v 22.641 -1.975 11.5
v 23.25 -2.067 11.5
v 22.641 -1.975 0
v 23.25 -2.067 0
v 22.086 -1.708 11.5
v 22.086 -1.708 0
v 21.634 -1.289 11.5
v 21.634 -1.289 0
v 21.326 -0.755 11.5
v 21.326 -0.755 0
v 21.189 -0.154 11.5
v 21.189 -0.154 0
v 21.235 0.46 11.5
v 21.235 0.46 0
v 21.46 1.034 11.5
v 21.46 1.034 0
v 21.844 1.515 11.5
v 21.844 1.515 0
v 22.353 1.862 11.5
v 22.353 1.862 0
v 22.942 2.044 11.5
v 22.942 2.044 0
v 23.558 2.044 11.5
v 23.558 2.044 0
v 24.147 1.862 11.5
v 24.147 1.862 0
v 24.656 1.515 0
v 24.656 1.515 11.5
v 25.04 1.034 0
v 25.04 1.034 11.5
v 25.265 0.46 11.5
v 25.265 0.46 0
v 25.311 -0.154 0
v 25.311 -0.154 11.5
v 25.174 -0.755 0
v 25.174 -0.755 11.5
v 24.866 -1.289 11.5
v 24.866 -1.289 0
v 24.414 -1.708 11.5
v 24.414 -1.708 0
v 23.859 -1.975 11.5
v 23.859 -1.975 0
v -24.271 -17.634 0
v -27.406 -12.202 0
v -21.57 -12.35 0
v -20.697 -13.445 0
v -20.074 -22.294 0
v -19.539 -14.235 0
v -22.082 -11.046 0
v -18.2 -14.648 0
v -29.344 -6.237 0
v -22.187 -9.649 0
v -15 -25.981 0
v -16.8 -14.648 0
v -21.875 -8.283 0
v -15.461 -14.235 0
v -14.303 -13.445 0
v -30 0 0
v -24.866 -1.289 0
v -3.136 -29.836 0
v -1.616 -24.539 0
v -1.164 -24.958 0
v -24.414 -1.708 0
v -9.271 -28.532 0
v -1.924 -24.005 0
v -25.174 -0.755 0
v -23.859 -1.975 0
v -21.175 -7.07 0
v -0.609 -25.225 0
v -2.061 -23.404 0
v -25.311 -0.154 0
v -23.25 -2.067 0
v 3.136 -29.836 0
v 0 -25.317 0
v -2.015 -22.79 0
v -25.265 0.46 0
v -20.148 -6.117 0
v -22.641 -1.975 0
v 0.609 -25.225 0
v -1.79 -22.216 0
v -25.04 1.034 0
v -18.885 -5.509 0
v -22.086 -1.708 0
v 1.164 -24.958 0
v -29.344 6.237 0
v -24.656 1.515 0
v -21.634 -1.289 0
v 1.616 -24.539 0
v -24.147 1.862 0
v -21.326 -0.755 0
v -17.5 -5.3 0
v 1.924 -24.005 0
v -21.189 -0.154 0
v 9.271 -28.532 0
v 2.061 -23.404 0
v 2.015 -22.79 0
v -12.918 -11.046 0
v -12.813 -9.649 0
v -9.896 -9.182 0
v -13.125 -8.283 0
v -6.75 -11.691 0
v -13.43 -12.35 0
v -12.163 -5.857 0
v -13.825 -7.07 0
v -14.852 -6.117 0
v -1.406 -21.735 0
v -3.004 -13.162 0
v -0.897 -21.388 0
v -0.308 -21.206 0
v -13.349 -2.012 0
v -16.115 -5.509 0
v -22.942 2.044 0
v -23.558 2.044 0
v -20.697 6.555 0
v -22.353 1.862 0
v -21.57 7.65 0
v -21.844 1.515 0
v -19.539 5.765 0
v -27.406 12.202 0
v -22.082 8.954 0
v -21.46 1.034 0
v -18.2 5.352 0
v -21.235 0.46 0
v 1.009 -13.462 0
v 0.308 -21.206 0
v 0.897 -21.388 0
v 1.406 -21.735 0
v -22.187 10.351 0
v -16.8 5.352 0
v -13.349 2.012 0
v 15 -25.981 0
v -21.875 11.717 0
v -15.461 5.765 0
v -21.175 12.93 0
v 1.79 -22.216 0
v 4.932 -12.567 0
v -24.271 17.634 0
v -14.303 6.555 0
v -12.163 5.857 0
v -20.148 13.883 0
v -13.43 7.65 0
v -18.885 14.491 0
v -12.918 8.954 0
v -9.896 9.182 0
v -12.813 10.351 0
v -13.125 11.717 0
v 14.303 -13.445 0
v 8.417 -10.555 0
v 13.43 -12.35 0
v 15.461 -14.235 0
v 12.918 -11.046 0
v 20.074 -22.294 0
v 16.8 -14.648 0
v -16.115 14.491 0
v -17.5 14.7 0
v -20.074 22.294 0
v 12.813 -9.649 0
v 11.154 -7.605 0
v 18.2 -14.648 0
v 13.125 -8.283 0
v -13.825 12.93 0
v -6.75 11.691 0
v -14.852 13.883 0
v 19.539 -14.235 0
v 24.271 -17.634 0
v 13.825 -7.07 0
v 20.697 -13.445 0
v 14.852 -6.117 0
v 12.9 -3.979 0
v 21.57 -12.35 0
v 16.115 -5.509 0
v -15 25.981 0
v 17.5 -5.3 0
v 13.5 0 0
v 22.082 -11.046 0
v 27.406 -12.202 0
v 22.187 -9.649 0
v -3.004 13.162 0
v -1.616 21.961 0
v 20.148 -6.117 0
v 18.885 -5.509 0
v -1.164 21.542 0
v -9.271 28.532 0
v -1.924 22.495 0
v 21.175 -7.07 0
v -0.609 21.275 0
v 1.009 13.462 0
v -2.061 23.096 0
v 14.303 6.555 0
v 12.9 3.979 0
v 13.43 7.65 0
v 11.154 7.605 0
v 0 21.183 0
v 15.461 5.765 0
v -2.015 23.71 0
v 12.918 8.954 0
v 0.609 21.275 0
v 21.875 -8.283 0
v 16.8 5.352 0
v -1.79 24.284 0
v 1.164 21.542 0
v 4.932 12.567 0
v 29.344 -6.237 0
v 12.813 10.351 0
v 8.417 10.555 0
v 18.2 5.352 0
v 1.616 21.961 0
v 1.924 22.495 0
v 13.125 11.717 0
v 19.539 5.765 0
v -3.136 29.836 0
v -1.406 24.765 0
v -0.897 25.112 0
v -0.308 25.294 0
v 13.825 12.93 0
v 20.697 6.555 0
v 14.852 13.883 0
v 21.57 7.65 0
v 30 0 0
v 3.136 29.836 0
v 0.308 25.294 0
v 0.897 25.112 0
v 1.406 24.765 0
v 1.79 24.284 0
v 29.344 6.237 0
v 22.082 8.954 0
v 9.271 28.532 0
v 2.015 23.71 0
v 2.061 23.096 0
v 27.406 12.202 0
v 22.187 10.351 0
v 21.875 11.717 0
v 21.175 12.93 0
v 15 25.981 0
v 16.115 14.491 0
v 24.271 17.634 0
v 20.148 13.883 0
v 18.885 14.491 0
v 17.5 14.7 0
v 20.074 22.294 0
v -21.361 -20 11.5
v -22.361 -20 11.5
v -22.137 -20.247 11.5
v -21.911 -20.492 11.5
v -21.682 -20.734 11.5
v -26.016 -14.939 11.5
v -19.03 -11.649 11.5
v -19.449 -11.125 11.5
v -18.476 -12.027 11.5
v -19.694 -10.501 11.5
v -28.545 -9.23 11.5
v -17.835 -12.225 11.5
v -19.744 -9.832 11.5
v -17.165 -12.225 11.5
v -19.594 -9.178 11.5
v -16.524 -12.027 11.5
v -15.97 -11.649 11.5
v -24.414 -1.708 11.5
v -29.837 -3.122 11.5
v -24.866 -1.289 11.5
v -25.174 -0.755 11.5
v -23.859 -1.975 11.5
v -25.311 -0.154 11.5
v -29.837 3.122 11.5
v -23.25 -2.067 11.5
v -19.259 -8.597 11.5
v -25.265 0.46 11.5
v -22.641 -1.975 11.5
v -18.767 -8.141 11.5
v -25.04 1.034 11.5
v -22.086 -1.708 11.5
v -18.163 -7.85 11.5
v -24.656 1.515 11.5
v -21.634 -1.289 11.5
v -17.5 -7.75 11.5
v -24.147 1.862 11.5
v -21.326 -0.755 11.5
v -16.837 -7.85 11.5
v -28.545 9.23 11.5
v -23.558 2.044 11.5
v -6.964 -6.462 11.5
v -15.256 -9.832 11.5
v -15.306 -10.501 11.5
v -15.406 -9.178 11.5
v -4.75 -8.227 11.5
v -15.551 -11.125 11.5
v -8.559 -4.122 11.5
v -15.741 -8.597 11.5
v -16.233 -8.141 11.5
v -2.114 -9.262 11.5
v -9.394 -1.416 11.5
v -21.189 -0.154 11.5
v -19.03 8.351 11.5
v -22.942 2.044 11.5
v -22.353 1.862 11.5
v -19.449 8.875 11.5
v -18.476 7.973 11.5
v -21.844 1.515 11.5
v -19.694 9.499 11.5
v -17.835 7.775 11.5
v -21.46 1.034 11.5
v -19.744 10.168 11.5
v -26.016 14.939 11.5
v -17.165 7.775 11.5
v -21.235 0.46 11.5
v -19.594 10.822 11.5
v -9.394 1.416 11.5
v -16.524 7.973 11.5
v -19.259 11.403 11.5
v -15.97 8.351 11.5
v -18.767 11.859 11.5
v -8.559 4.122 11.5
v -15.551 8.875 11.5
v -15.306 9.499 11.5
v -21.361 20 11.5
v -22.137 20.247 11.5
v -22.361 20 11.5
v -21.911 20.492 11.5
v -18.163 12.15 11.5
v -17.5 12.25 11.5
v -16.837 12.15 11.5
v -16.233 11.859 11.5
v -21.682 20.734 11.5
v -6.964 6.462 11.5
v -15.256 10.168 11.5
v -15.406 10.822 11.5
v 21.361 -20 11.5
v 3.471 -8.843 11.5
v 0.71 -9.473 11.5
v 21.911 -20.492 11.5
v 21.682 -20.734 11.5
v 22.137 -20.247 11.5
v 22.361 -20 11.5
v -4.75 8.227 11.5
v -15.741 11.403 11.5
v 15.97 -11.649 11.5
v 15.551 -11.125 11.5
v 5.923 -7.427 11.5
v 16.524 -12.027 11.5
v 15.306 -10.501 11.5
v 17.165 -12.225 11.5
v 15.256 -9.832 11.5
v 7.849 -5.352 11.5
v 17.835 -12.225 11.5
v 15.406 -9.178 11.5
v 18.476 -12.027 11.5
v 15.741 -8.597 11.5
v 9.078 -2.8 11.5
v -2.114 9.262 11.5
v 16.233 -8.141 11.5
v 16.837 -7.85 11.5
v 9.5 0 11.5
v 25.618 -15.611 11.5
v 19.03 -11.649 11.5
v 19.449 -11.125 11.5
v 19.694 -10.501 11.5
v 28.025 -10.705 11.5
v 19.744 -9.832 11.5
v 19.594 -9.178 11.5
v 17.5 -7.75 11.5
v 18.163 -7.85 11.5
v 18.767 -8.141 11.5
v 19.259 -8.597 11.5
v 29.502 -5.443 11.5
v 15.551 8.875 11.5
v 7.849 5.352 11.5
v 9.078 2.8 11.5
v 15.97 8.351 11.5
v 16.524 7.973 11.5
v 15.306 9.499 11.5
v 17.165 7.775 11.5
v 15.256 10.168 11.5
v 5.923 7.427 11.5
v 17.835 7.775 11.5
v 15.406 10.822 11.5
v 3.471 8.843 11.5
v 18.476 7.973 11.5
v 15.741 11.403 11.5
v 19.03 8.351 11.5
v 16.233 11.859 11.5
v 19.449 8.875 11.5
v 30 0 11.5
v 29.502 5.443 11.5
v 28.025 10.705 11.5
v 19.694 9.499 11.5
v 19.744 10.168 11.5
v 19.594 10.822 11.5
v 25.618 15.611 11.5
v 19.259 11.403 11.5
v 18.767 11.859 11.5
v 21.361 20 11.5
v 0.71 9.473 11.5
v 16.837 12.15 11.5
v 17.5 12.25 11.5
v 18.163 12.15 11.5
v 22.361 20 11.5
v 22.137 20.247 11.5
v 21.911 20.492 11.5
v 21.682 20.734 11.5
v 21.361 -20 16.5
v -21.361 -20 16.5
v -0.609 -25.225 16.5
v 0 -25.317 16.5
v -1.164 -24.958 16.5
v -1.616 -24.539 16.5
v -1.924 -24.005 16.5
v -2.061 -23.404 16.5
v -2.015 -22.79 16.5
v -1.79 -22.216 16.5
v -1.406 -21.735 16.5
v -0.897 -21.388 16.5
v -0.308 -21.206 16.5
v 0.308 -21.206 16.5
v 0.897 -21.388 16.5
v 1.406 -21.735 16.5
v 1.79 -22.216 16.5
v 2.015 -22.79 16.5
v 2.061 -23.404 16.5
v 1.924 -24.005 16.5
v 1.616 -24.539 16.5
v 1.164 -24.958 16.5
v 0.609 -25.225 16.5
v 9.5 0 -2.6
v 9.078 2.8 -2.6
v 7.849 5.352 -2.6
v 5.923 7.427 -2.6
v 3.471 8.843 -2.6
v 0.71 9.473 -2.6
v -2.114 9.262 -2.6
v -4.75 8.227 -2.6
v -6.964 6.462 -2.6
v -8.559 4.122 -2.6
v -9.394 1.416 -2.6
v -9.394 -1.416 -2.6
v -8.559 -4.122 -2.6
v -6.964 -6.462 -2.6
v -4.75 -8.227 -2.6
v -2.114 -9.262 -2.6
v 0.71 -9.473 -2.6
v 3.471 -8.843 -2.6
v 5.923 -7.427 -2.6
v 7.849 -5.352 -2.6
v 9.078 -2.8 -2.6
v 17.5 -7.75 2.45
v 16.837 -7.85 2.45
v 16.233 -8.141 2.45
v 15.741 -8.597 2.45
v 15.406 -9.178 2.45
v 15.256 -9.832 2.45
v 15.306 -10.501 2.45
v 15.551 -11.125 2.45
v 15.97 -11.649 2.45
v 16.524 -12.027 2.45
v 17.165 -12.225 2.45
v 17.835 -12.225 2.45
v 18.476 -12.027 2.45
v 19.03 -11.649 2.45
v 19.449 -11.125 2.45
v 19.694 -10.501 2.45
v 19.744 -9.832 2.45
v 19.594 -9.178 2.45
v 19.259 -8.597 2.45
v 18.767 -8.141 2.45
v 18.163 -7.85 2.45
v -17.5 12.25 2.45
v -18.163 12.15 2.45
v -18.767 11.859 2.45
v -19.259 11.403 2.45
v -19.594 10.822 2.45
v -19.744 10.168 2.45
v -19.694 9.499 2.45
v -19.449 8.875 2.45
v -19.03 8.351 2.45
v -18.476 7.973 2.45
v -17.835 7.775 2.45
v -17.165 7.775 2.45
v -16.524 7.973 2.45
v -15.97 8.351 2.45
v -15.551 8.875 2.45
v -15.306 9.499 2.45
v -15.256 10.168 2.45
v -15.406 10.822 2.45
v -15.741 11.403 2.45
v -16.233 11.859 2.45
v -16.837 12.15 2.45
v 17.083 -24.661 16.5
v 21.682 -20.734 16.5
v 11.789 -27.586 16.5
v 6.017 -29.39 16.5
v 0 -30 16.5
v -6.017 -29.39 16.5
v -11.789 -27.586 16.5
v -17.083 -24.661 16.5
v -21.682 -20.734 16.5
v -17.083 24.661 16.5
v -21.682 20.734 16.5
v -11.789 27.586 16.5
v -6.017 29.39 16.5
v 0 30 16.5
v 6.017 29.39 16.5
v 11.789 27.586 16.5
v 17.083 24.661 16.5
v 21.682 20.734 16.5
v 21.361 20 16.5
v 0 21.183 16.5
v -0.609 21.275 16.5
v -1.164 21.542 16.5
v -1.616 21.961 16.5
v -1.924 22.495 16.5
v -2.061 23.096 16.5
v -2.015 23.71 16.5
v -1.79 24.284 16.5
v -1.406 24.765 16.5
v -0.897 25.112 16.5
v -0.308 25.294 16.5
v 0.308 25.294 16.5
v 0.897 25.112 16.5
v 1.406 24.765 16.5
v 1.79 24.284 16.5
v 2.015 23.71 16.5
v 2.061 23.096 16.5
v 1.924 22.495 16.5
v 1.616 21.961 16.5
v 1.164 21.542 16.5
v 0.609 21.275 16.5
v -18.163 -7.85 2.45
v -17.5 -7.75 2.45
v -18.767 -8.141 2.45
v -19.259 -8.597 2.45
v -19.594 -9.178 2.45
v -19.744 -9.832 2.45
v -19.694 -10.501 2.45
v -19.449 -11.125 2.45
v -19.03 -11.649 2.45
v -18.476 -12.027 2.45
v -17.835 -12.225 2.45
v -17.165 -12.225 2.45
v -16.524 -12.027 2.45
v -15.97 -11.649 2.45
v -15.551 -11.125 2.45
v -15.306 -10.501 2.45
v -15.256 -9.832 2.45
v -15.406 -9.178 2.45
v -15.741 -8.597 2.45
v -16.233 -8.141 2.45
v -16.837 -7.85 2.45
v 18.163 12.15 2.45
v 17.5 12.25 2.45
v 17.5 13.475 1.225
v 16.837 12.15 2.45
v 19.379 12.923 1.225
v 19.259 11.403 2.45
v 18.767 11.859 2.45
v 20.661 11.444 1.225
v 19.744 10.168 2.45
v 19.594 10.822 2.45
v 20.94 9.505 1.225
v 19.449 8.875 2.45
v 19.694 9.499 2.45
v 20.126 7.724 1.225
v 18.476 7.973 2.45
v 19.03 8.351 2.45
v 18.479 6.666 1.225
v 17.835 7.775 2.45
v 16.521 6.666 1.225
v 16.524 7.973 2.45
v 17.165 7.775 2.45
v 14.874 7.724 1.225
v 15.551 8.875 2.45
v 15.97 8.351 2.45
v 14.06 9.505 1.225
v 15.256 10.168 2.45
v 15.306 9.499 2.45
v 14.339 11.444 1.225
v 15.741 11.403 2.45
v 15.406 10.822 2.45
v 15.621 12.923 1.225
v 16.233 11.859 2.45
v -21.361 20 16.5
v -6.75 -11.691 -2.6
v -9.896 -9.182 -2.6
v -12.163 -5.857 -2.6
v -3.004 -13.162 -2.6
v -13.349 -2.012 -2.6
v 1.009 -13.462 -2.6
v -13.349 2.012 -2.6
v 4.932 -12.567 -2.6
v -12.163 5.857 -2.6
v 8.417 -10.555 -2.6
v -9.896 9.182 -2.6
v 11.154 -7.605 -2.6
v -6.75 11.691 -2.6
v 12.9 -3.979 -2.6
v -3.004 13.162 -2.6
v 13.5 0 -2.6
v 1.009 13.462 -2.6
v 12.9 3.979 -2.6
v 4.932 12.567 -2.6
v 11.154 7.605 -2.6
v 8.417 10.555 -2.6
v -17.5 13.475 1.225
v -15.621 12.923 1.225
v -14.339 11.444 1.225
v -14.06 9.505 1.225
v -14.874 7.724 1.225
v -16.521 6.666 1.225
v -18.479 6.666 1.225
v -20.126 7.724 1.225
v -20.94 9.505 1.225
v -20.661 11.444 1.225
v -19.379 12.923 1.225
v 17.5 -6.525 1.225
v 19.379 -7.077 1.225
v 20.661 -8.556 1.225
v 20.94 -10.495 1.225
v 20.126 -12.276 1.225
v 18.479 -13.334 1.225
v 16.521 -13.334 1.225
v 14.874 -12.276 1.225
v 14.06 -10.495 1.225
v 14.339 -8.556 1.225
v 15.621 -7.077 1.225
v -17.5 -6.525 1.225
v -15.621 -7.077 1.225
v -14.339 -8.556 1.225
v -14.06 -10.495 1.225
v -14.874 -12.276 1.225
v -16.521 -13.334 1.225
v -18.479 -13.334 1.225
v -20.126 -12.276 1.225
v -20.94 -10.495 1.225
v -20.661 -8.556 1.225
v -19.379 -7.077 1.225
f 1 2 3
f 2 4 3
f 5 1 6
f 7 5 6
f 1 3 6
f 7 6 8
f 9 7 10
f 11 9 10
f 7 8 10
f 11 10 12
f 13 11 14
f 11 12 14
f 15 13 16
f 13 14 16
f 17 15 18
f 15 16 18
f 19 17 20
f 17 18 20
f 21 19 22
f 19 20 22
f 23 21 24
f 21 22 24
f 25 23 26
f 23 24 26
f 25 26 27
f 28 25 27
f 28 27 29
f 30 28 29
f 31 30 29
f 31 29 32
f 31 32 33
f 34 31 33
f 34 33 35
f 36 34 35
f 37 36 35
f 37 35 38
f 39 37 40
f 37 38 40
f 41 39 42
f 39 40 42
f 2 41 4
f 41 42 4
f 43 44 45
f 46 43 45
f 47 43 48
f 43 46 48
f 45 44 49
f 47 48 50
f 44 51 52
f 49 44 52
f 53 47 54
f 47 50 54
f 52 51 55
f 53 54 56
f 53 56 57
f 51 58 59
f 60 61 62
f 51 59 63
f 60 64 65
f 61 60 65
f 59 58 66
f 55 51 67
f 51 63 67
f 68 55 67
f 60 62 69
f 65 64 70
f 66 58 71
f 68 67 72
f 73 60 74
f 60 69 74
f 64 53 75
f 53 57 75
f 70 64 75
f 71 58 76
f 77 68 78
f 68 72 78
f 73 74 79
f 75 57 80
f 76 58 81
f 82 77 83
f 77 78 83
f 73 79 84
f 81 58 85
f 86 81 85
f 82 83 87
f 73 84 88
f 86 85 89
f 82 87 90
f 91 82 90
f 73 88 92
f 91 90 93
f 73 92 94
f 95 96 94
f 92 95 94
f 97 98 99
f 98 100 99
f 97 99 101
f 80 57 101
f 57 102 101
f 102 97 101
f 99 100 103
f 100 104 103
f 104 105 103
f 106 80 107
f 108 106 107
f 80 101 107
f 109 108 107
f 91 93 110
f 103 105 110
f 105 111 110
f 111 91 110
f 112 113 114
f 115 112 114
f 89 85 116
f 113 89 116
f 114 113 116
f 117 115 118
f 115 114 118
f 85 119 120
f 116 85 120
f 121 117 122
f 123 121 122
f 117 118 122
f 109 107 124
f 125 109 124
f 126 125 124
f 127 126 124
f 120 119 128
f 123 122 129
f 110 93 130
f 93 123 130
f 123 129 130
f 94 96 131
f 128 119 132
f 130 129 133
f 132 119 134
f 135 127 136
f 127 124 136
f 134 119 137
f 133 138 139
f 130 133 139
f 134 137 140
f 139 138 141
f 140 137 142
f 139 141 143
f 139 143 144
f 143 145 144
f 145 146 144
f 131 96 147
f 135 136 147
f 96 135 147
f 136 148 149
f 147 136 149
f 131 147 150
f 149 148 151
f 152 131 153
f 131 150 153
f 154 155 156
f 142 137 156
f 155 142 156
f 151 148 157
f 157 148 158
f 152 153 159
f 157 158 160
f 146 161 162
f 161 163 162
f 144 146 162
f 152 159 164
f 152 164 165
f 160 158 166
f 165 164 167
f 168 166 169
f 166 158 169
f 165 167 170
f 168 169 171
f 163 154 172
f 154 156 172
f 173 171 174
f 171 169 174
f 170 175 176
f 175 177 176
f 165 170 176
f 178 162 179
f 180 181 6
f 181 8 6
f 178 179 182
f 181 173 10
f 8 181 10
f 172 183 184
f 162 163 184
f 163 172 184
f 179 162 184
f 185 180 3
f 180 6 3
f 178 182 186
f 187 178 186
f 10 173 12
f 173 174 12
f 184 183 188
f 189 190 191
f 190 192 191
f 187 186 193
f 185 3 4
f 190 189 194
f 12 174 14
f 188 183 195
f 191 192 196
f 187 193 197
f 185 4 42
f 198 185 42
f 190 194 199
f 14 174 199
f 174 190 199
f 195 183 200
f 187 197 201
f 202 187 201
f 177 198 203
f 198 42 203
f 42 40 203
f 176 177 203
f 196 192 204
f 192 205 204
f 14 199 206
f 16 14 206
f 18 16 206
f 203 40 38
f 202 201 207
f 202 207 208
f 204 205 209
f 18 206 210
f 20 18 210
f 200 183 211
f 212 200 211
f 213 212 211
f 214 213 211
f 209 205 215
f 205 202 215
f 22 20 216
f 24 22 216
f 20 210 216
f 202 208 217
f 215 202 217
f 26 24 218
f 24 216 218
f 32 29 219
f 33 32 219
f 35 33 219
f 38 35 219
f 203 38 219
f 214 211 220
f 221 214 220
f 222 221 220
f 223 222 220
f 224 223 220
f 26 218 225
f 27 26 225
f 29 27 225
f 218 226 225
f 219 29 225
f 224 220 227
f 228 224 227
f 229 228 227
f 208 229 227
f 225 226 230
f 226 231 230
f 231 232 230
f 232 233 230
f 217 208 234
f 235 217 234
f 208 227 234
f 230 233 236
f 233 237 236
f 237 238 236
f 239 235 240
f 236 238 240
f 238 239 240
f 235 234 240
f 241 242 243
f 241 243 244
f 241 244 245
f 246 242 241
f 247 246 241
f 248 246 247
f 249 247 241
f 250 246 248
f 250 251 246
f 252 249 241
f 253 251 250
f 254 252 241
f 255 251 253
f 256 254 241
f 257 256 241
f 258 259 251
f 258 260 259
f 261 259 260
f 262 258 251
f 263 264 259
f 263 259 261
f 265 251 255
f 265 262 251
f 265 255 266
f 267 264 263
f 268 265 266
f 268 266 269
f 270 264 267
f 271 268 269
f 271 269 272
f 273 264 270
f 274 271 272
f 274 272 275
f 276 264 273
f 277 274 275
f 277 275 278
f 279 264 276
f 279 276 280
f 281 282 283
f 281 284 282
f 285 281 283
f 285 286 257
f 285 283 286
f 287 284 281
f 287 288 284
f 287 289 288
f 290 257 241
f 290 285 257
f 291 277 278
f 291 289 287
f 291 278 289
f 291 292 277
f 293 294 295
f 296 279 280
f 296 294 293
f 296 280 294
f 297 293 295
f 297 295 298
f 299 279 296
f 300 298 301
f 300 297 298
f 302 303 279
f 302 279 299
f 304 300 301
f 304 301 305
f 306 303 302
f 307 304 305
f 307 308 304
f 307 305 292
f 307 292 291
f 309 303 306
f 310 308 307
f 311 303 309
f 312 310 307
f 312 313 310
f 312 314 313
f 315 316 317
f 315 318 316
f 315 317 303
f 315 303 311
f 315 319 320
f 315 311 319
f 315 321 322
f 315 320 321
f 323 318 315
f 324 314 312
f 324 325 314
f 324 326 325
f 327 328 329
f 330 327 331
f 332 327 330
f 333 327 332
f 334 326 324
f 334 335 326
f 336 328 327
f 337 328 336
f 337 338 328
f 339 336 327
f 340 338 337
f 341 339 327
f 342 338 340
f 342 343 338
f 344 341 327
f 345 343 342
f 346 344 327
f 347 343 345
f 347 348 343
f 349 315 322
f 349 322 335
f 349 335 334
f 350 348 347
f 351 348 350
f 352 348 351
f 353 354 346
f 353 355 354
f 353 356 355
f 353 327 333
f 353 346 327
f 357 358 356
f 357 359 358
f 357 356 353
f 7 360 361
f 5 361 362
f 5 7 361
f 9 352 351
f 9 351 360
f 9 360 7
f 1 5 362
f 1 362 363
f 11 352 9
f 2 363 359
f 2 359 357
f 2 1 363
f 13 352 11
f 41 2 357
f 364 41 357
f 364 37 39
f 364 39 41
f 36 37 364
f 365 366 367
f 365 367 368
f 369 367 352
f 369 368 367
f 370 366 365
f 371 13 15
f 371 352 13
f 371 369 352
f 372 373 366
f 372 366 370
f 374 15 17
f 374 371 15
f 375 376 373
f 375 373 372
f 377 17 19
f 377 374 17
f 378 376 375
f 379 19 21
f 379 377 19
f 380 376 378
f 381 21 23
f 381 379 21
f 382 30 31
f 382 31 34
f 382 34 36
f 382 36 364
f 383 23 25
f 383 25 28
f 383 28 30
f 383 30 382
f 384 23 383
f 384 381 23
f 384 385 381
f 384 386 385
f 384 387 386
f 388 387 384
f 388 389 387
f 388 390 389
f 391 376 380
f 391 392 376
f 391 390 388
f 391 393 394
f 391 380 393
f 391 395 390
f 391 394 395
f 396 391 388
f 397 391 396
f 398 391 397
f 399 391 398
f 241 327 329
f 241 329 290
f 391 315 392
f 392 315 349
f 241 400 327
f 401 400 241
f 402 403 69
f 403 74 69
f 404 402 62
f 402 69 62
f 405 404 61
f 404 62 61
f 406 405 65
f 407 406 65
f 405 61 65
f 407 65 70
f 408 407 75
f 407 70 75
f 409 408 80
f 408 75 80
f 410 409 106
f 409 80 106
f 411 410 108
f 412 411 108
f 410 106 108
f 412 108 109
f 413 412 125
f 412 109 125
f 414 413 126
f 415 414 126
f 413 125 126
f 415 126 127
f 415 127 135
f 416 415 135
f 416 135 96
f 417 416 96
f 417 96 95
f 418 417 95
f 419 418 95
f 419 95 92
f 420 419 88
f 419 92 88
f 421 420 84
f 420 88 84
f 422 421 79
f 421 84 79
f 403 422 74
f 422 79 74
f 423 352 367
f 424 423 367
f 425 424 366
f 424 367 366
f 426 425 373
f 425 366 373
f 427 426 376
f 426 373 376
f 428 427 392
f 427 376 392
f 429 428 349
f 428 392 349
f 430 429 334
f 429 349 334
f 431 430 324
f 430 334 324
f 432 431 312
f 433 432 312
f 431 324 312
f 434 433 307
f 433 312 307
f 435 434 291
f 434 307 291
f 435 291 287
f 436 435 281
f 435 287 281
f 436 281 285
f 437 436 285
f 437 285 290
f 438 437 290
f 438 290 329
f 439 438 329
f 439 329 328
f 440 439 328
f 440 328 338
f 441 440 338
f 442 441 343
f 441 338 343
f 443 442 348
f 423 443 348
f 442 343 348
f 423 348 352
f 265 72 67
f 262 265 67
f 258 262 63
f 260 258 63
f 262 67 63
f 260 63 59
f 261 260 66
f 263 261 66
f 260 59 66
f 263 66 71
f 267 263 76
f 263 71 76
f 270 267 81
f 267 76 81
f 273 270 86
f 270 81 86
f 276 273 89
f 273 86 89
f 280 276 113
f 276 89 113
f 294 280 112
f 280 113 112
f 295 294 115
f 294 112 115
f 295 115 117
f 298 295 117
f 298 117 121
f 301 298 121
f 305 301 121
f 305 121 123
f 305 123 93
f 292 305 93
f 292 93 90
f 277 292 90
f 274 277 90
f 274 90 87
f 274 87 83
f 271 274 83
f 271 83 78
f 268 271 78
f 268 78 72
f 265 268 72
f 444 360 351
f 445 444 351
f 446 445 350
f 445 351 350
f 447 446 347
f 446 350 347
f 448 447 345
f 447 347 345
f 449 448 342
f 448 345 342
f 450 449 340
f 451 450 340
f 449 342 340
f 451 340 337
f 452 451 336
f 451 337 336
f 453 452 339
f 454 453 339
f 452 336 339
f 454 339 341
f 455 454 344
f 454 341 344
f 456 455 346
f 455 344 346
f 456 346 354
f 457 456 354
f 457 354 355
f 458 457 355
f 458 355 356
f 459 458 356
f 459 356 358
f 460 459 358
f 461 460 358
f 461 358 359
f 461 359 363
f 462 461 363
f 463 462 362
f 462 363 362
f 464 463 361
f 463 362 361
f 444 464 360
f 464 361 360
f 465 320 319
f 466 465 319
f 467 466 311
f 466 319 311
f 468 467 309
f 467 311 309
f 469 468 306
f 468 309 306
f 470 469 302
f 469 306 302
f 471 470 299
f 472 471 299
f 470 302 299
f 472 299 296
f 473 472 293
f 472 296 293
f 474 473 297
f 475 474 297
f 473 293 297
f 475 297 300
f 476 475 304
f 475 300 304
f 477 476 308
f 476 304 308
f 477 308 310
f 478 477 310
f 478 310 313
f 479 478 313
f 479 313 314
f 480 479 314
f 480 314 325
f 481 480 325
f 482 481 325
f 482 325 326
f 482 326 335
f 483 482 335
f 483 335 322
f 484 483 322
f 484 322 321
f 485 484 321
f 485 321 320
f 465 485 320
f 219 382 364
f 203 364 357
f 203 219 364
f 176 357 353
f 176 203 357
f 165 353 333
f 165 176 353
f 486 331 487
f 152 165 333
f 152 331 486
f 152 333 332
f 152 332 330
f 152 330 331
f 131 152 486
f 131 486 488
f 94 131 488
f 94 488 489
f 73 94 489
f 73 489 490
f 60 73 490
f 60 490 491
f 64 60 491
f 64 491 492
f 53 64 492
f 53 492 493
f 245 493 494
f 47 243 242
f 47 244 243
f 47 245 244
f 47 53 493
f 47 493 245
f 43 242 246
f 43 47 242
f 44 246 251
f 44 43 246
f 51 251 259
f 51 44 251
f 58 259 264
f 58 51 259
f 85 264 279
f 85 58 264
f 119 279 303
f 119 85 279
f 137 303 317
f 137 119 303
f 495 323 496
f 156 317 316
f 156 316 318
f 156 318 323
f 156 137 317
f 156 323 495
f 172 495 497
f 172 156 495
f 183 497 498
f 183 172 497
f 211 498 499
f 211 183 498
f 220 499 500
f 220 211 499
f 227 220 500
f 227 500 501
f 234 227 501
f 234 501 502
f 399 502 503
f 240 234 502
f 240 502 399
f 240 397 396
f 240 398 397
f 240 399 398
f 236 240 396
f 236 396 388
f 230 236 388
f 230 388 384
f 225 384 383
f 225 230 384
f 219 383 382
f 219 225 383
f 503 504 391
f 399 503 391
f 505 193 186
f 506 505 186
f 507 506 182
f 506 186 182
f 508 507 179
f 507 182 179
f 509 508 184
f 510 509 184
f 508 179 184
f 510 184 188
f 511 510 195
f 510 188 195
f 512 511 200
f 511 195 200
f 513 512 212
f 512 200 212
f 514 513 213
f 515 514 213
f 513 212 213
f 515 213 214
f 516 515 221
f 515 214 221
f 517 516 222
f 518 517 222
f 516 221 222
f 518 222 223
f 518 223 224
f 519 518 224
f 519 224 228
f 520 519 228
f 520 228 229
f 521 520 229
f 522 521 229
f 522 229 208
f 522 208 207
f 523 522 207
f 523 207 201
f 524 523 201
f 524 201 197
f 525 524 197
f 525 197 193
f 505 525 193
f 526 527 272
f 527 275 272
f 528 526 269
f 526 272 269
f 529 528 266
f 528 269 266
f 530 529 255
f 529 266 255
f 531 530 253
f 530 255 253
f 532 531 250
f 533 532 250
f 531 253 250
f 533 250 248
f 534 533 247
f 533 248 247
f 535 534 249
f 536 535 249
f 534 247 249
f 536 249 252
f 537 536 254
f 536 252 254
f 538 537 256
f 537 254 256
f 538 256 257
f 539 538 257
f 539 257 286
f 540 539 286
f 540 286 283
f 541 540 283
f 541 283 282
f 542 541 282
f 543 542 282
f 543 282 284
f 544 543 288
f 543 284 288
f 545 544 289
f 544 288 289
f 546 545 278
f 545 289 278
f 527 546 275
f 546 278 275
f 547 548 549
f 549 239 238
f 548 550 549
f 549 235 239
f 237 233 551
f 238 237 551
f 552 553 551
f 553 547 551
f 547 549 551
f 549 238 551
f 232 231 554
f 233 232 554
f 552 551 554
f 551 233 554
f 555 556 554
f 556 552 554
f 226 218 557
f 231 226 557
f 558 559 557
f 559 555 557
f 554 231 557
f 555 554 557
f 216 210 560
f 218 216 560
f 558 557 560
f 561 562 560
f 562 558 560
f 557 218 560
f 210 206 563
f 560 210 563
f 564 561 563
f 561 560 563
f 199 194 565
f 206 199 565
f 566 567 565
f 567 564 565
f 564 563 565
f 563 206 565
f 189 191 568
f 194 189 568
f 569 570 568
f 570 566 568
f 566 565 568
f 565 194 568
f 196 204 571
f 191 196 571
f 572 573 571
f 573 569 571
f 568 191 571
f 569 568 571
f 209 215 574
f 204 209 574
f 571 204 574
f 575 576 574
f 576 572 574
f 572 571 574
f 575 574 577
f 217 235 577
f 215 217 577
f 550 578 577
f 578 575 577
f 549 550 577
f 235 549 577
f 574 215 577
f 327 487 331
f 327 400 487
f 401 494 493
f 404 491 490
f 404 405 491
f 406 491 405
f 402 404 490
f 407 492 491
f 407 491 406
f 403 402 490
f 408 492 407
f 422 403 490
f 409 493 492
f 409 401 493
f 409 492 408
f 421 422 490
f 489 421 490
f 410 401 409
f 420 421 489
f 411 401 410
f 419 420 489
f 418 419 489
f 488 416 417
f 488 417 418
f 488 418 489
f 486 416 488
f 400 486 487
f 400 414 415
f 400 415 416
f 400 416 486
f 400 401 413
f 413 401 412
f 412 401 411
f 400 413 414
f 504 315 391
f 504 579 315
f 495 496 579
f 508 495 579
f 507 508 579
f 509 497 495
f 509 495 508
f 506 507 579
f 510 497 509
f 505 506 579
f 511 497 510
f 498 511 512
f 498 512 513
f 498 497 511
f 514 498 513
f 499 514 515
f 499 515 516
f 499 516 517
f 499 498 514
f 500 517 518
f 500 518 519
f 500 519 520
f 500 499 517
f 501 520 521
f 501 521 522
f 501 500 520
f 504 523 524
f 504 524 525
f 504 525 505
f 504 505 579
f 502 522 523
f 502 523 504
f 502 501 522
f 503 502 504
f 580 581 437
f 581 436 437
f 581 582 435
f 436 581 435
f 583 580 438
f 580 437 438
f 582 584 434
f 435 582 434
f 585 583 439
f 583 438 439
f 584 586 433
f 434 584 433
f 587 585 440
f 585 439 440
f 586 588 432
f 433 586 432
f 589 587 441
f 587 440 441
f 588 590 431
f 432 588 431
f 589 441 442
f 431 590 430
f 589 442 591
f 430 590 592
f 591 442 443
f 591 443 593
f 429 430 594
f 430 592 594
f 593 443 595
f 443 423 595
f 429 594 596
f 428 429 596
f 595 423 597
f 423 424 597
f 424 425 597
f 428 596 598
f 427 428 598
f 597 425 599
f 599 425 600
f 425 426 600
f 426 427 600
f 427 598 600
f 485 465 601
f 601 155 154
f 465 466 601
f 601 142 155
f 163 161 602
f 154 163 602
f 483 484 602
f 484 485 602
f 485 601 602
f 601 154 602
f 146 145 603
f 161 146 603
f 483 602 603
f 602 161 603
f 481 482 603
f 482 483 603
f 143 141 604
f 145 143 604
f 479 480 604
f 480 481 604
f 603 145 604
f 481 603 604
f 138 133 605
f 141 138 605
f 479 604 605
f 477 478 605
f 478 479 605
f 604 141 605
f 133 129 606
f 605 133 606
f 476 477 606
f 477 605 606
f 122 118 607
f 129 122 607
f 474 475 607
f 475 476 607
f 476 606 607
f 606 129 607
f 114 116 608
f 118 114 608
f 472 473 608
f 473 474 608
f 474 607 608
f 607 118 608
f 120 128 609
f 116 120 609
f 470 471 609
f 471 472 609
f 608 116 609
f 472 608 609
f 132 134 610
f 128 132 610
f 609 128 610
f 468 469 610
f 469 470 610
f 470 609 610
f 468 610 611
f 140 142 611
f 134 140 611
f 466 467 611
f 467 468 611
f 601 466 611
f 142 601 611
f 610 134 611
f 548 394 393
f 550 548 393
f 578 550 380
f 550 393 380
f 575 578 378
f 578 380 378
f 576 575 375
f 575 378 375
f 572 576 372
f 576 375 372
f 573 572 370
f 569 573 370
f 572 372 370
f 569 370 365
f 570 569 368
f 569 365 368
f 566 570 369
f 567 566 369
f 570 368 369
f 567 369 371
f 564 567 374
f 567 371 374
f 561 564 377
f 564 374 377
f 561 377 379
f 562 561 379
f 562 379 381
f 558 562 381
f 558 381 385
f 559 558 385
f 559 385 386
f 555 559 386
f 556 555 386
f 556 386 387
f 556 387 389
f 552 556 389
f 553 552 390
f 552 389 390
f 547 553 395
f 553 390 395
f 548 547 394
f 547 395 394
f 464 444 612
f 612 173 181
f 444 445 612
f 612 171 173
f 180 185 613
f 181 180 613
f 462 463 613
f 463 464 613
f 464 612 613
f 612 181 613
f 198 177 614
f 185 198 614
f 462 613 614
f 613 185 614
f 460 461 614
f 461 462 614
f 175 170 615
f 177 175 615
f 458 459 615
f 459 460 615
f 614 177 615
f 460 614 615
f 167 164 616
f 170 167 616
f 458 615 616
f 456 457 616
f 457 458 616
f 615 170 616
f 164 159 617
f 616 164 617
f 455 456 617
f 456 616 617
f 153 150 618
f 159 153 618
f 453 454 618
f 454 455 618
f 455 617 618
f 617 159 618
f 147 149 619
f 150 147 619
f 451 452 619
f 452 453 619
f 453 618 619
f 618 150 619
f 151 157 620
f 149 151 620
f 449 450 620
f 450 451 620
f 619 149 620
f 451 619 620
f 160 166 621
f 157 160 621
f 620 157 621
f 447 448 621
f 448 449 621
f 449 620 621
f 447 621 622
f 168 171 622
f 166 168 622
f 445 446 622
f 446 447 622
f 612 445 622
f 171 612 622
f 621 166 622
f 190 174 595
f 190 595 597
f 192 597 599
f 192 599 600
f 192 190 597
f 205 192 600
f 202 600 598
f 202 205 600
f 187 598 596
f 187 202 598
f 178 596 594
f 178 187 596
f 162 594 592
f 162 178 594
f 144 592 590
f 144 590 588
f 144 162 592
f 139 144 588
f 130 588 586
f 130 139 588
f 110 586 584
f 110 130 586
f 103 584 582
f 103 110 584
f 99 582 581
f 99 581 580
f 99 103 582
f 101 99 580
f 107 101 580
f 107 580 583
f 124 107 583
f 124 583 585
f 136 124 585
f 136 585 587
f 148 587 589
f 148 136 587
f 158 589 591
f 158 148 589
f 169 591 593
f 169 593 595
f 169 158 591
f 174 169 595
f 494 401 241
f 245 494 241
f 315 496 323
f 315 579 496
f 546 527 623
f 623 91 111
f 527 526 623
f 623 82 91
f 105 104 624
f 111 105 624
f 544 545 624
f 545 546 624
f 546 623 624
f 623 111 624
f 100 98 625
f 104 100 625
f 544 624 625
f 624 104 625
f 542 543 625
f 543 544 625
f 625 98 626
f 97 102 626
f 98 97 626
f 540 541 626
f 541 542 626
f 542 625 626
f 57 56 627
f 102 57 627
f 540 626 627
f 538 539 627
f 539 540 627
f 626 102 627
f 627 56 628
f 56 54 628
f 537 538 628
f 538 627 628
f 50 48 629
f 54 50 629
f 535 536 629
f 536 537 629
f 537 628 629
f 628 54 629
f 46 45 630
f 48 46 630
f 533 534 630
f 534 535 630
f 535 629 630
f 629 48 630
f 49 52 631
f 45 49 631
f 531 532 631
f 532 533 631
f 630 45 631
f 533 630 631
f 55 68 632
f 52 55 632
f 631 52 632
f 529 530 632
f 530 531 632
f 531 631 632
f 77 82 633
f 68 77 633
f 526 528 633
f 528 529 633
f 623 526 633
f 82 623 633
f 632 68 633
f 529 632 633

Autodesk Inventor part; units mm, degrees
ref_plane "Arbeitsebene3" through (0, 0, 50) normal (0, 0, 1) x (1, 0, 0)
ref_plane "Arbeitsebene4" through (0, 0, 130) normal (0, 0, 1) x (1, 0, 0)
sketch "Skizze1" plane through (0, 0, 0) normal (0, 0, 1) x (1, 0, 0)
  circle A0 centre (0, 0) radius 30
  circle A1 centre (0, 0) radius 13.5
  circle A2 centre (0, 0) radius 9.5
  circle A3 centre (0, 0) radius 23.25 construction
  line L0 (0, 0) -> (0, 23.25) construction
  line L1 (0, 0) -> (0, 30) construction
  point P0 (-23.25, 0)
  point P1 (0, -23.25)
  point P2 (23.25, 0)
  dimension "d3" = 30
  dimension "d4" = 46.5
  dimension "d0" = 4
  dimension "d1" = 27
  dimension "d7" = 360
  dimension "d99" = 0
extrude "Extrusion1" add sketch "Skizze1" along normal blind 16.5 contours A0 | A1
extrude "Extrusion2" add sketch "Skizze1" against normal blind 2.6 contours A1
sketch "Skizze2" plane through (0, 0, 16.5) normal (0, 0, 1) x (1, 0, 0)
  point P0 (0, 0)
  point P1 (0, 23.25)
  point P2 (23.25, 0)
  point P3 (0, -23.25)
  point P4 (-23.25, 0)
hole "Bohrung1" at (0, 23.25, 16.5) at (23.25, 0, 16.5) at (0, -23.25, 16.5) at (-23.25, 0, 16.5) direction (0, 0, -1) diameter 4.134 end through all thread size "M5x0.8" class "6H" standard "ISO Metric profile"
ref_plane "Arbeitsebene1" through (0, 0, 10) normal (0, 0, 1) x (1, 0, 0)
sketch "Skizze10" plane through (0, 0, 16.5) normal (0, 0, 1) x (1, 0, 0)
  line L0 (-30, 20) -> (30, 20)
  line L1 (30, 20) -> (30, -20)
  line L2 (30, -20) -> (-30, -20)
  line L3 (-30, -20) -> (-30, 20)
  line L4 (-30, 20) -> (30, -20) construction
  line L5 (30, 20) -> (-30, -20) construction
  circle A0 centre (0, 0) radius 30 projected
  circle A1 centre (-23.25, 0) radius 2.067 construction
  circle A2 centre (0, -23.25) radius 2.067 construction
  line L6 (-20, 0) -> (20, 0) construction
  circle A3 centre (0, 0) radius 30 projected
  line L7 (0, 42) -> (0, -42) construction
  line L8 (-17.5, 10) -> (17.5, 10) construction
  line L9 (17.5, 10) -> (17.5, -10) construction
  line L10 (17.5, -10) -> (-17.5, -10) construction
  line L11 (-17.5, -10) -> (-17.5, 10) construction
  line L12 (-17.5, 10) -> (17.5, -10) construction
  line L13 (17.5, 10) -> (-17.5, -10) construction
  point P0 (-22.3607, 20)
  point P1 (-22.3607, -20)
  point P2 (22.3607, -20)
  point P3 (22.3607, 20)
  point P4 (30, 0)
  point P5 (-30, 0)
  dimension "d81" = 40
  dimension "ItemFixation_HoleDia" = 40
  dimension "d102" = 20
  dimension "d103" = 35
extrude "Extrusion7" cut sketch "Skizze10" against normal blind 5 contours L0 A0 L3 | L0 A0 L2 | A0 L2 L3 | L0 L1 A0 | L1 L2 A0
sketch "Skizze11" plane through (0, 0, 0) normal (0, 0, -1) x (-1, 0, 0)
  point P0 (0, 0)
  point P1 (-17.5, 10)
  point P2 (-17.5, -10)
  point P3 (17.5, -10)
  point P4 (17.5, 10)
  dimension "MainAxis_Schluesselweite" = 24
  dimension "d46" = 1
  dimension "d52" = 32
hole "Bohrung4" at (17.5, 10, 0) at (17.5, -10, 0) at (-17.5, -10, 0) at (-17.5, 10, 0) direction (0, 0, 1) diameter 4.5 end through all countersink diameter 9.4 countersink angle 90 clearance for "Senkschraube mit Linsenkopf ISO 2010" size "M4" standard "DIN"
chamfer "Fase3" distance 1 angle 45 4 edges at (22.3607, 20, 14) (-22.3607, 20, 14) (-22.3607, -20, 14) (22.3607, -20, 14)
sketch "Skizze8" plane through (12, -16, 160) normal (1, 0, 0) x (0, 0, -1)
  line L0 (30, -26) -> (30, 58) construction
  line L1 (-32.52, 16) -> (195.12, 16) construction
  point P0 (160, 16)
  point P1 (30, 16)
  dimension "Flansch_ParralelMech_FlatPart_Width" = 140
sketch "Skizze4" plane through (0, 0, 0) normal (1, 0, 0) x (0, 1, 0)
  line L0 (9.5, -2.6) -> (-9.5, -2.6) construction
  line L1 (0, 200.32) -> (0, -36.42) construction
  line L2 (-9.5, 16.5) -> (-9.5, -2.6) construction
  line L3 (9.5, 16.5) -> (9.5, -2.6) construction
  line L4 (-9.5, 16.5) -> (9.5, 16.5) construction
  line L5 (-9.5, 2.4) -> (9.5, 2.4)
  line L6 (-9.5, 2.4) -> (-9.5, 16.5)
  line L7 (-9.5, 16.5) -> (-20, 16.5)
  line L8 (-20, 16.5) -> (-20, 166.5)
  line L9 (-20, 166.5) -> (20, 166.5)
  line L10 (20, 16.5) -> (9.5, 16.5)
  line L11 (9.5, 16.5) -> (9.5, 2.4)
  line L12 (20, 166.5) -> (20, 16.5)
  line L13 (0, 2.4) -> (0, 166.5)
  point P0 (0, 0)
  dimension "d27" = 5
  dimension "d31" = 150
  dimension "d33" = 40
sketch "Skizze7" plane through (0, 0, 50) normal (0, 0, 1) x (1, 0, 0)
  line L0 (-12, 16) -> (-12, -16) construction
  line L1 (-12, 15) -> (-3, 15)
  line L2 (-3, 15) -> (-3, 11.425)
  line L3 (-3, 11.425) -> (3, 11.425)
  line L4 (3, 11.425) -> (3, 15)
  line L5 (3, 15) -> (12, 15)
  line L6 (-12, 0) -> (-12, 15)
  line L7 (0, -16) -> (0, 16) construction
  line L8 (12, -16) -> (12, 16) construction
  line L9 (12, 15) -> (12, 0)
  line L10 (-12, 0) -> (12, 0)
  line L11 (-42, 0) -> (42, 0) construction
  point P0 (0, 11.425)
  point P1 (-12, -7.2111)
  point P2 (12, 7.2111)
  dimension "d51" = 9
  dimension "d63" = 30
  dimension "d64" = 22.85
equation "\"d3\" = Flansch_FemalePart_OuterDia"
equation "\"d4\" = Flansch_FemalePart_HoleDia"
equation "\"d1\" = Flansch_Klemmdeckelausnahme_Dia"
equation "\"d102\" = Item40x40_TrackDistance"
equation "\"d33\" = d28"
equation "\"Total_Bearing_Hole_Dist\" = 80"
equation "\"Flansch_FemalePart_OuterDia\" = 30"
equation "\"Flansch_FemalePart_HoleDia\" = 46.5"
equation "\"Flansch_Klemmdeckelausnahme_Dia\" = 27"
equation "\"Item40x40_TrackDistance\" = 20"
equation "\"d28\" = 40"
properties part number "Flansch_FemalePart_MainAxis_HeadConnectorBase_V2.1_Item40x40" material "Edelstahl"
